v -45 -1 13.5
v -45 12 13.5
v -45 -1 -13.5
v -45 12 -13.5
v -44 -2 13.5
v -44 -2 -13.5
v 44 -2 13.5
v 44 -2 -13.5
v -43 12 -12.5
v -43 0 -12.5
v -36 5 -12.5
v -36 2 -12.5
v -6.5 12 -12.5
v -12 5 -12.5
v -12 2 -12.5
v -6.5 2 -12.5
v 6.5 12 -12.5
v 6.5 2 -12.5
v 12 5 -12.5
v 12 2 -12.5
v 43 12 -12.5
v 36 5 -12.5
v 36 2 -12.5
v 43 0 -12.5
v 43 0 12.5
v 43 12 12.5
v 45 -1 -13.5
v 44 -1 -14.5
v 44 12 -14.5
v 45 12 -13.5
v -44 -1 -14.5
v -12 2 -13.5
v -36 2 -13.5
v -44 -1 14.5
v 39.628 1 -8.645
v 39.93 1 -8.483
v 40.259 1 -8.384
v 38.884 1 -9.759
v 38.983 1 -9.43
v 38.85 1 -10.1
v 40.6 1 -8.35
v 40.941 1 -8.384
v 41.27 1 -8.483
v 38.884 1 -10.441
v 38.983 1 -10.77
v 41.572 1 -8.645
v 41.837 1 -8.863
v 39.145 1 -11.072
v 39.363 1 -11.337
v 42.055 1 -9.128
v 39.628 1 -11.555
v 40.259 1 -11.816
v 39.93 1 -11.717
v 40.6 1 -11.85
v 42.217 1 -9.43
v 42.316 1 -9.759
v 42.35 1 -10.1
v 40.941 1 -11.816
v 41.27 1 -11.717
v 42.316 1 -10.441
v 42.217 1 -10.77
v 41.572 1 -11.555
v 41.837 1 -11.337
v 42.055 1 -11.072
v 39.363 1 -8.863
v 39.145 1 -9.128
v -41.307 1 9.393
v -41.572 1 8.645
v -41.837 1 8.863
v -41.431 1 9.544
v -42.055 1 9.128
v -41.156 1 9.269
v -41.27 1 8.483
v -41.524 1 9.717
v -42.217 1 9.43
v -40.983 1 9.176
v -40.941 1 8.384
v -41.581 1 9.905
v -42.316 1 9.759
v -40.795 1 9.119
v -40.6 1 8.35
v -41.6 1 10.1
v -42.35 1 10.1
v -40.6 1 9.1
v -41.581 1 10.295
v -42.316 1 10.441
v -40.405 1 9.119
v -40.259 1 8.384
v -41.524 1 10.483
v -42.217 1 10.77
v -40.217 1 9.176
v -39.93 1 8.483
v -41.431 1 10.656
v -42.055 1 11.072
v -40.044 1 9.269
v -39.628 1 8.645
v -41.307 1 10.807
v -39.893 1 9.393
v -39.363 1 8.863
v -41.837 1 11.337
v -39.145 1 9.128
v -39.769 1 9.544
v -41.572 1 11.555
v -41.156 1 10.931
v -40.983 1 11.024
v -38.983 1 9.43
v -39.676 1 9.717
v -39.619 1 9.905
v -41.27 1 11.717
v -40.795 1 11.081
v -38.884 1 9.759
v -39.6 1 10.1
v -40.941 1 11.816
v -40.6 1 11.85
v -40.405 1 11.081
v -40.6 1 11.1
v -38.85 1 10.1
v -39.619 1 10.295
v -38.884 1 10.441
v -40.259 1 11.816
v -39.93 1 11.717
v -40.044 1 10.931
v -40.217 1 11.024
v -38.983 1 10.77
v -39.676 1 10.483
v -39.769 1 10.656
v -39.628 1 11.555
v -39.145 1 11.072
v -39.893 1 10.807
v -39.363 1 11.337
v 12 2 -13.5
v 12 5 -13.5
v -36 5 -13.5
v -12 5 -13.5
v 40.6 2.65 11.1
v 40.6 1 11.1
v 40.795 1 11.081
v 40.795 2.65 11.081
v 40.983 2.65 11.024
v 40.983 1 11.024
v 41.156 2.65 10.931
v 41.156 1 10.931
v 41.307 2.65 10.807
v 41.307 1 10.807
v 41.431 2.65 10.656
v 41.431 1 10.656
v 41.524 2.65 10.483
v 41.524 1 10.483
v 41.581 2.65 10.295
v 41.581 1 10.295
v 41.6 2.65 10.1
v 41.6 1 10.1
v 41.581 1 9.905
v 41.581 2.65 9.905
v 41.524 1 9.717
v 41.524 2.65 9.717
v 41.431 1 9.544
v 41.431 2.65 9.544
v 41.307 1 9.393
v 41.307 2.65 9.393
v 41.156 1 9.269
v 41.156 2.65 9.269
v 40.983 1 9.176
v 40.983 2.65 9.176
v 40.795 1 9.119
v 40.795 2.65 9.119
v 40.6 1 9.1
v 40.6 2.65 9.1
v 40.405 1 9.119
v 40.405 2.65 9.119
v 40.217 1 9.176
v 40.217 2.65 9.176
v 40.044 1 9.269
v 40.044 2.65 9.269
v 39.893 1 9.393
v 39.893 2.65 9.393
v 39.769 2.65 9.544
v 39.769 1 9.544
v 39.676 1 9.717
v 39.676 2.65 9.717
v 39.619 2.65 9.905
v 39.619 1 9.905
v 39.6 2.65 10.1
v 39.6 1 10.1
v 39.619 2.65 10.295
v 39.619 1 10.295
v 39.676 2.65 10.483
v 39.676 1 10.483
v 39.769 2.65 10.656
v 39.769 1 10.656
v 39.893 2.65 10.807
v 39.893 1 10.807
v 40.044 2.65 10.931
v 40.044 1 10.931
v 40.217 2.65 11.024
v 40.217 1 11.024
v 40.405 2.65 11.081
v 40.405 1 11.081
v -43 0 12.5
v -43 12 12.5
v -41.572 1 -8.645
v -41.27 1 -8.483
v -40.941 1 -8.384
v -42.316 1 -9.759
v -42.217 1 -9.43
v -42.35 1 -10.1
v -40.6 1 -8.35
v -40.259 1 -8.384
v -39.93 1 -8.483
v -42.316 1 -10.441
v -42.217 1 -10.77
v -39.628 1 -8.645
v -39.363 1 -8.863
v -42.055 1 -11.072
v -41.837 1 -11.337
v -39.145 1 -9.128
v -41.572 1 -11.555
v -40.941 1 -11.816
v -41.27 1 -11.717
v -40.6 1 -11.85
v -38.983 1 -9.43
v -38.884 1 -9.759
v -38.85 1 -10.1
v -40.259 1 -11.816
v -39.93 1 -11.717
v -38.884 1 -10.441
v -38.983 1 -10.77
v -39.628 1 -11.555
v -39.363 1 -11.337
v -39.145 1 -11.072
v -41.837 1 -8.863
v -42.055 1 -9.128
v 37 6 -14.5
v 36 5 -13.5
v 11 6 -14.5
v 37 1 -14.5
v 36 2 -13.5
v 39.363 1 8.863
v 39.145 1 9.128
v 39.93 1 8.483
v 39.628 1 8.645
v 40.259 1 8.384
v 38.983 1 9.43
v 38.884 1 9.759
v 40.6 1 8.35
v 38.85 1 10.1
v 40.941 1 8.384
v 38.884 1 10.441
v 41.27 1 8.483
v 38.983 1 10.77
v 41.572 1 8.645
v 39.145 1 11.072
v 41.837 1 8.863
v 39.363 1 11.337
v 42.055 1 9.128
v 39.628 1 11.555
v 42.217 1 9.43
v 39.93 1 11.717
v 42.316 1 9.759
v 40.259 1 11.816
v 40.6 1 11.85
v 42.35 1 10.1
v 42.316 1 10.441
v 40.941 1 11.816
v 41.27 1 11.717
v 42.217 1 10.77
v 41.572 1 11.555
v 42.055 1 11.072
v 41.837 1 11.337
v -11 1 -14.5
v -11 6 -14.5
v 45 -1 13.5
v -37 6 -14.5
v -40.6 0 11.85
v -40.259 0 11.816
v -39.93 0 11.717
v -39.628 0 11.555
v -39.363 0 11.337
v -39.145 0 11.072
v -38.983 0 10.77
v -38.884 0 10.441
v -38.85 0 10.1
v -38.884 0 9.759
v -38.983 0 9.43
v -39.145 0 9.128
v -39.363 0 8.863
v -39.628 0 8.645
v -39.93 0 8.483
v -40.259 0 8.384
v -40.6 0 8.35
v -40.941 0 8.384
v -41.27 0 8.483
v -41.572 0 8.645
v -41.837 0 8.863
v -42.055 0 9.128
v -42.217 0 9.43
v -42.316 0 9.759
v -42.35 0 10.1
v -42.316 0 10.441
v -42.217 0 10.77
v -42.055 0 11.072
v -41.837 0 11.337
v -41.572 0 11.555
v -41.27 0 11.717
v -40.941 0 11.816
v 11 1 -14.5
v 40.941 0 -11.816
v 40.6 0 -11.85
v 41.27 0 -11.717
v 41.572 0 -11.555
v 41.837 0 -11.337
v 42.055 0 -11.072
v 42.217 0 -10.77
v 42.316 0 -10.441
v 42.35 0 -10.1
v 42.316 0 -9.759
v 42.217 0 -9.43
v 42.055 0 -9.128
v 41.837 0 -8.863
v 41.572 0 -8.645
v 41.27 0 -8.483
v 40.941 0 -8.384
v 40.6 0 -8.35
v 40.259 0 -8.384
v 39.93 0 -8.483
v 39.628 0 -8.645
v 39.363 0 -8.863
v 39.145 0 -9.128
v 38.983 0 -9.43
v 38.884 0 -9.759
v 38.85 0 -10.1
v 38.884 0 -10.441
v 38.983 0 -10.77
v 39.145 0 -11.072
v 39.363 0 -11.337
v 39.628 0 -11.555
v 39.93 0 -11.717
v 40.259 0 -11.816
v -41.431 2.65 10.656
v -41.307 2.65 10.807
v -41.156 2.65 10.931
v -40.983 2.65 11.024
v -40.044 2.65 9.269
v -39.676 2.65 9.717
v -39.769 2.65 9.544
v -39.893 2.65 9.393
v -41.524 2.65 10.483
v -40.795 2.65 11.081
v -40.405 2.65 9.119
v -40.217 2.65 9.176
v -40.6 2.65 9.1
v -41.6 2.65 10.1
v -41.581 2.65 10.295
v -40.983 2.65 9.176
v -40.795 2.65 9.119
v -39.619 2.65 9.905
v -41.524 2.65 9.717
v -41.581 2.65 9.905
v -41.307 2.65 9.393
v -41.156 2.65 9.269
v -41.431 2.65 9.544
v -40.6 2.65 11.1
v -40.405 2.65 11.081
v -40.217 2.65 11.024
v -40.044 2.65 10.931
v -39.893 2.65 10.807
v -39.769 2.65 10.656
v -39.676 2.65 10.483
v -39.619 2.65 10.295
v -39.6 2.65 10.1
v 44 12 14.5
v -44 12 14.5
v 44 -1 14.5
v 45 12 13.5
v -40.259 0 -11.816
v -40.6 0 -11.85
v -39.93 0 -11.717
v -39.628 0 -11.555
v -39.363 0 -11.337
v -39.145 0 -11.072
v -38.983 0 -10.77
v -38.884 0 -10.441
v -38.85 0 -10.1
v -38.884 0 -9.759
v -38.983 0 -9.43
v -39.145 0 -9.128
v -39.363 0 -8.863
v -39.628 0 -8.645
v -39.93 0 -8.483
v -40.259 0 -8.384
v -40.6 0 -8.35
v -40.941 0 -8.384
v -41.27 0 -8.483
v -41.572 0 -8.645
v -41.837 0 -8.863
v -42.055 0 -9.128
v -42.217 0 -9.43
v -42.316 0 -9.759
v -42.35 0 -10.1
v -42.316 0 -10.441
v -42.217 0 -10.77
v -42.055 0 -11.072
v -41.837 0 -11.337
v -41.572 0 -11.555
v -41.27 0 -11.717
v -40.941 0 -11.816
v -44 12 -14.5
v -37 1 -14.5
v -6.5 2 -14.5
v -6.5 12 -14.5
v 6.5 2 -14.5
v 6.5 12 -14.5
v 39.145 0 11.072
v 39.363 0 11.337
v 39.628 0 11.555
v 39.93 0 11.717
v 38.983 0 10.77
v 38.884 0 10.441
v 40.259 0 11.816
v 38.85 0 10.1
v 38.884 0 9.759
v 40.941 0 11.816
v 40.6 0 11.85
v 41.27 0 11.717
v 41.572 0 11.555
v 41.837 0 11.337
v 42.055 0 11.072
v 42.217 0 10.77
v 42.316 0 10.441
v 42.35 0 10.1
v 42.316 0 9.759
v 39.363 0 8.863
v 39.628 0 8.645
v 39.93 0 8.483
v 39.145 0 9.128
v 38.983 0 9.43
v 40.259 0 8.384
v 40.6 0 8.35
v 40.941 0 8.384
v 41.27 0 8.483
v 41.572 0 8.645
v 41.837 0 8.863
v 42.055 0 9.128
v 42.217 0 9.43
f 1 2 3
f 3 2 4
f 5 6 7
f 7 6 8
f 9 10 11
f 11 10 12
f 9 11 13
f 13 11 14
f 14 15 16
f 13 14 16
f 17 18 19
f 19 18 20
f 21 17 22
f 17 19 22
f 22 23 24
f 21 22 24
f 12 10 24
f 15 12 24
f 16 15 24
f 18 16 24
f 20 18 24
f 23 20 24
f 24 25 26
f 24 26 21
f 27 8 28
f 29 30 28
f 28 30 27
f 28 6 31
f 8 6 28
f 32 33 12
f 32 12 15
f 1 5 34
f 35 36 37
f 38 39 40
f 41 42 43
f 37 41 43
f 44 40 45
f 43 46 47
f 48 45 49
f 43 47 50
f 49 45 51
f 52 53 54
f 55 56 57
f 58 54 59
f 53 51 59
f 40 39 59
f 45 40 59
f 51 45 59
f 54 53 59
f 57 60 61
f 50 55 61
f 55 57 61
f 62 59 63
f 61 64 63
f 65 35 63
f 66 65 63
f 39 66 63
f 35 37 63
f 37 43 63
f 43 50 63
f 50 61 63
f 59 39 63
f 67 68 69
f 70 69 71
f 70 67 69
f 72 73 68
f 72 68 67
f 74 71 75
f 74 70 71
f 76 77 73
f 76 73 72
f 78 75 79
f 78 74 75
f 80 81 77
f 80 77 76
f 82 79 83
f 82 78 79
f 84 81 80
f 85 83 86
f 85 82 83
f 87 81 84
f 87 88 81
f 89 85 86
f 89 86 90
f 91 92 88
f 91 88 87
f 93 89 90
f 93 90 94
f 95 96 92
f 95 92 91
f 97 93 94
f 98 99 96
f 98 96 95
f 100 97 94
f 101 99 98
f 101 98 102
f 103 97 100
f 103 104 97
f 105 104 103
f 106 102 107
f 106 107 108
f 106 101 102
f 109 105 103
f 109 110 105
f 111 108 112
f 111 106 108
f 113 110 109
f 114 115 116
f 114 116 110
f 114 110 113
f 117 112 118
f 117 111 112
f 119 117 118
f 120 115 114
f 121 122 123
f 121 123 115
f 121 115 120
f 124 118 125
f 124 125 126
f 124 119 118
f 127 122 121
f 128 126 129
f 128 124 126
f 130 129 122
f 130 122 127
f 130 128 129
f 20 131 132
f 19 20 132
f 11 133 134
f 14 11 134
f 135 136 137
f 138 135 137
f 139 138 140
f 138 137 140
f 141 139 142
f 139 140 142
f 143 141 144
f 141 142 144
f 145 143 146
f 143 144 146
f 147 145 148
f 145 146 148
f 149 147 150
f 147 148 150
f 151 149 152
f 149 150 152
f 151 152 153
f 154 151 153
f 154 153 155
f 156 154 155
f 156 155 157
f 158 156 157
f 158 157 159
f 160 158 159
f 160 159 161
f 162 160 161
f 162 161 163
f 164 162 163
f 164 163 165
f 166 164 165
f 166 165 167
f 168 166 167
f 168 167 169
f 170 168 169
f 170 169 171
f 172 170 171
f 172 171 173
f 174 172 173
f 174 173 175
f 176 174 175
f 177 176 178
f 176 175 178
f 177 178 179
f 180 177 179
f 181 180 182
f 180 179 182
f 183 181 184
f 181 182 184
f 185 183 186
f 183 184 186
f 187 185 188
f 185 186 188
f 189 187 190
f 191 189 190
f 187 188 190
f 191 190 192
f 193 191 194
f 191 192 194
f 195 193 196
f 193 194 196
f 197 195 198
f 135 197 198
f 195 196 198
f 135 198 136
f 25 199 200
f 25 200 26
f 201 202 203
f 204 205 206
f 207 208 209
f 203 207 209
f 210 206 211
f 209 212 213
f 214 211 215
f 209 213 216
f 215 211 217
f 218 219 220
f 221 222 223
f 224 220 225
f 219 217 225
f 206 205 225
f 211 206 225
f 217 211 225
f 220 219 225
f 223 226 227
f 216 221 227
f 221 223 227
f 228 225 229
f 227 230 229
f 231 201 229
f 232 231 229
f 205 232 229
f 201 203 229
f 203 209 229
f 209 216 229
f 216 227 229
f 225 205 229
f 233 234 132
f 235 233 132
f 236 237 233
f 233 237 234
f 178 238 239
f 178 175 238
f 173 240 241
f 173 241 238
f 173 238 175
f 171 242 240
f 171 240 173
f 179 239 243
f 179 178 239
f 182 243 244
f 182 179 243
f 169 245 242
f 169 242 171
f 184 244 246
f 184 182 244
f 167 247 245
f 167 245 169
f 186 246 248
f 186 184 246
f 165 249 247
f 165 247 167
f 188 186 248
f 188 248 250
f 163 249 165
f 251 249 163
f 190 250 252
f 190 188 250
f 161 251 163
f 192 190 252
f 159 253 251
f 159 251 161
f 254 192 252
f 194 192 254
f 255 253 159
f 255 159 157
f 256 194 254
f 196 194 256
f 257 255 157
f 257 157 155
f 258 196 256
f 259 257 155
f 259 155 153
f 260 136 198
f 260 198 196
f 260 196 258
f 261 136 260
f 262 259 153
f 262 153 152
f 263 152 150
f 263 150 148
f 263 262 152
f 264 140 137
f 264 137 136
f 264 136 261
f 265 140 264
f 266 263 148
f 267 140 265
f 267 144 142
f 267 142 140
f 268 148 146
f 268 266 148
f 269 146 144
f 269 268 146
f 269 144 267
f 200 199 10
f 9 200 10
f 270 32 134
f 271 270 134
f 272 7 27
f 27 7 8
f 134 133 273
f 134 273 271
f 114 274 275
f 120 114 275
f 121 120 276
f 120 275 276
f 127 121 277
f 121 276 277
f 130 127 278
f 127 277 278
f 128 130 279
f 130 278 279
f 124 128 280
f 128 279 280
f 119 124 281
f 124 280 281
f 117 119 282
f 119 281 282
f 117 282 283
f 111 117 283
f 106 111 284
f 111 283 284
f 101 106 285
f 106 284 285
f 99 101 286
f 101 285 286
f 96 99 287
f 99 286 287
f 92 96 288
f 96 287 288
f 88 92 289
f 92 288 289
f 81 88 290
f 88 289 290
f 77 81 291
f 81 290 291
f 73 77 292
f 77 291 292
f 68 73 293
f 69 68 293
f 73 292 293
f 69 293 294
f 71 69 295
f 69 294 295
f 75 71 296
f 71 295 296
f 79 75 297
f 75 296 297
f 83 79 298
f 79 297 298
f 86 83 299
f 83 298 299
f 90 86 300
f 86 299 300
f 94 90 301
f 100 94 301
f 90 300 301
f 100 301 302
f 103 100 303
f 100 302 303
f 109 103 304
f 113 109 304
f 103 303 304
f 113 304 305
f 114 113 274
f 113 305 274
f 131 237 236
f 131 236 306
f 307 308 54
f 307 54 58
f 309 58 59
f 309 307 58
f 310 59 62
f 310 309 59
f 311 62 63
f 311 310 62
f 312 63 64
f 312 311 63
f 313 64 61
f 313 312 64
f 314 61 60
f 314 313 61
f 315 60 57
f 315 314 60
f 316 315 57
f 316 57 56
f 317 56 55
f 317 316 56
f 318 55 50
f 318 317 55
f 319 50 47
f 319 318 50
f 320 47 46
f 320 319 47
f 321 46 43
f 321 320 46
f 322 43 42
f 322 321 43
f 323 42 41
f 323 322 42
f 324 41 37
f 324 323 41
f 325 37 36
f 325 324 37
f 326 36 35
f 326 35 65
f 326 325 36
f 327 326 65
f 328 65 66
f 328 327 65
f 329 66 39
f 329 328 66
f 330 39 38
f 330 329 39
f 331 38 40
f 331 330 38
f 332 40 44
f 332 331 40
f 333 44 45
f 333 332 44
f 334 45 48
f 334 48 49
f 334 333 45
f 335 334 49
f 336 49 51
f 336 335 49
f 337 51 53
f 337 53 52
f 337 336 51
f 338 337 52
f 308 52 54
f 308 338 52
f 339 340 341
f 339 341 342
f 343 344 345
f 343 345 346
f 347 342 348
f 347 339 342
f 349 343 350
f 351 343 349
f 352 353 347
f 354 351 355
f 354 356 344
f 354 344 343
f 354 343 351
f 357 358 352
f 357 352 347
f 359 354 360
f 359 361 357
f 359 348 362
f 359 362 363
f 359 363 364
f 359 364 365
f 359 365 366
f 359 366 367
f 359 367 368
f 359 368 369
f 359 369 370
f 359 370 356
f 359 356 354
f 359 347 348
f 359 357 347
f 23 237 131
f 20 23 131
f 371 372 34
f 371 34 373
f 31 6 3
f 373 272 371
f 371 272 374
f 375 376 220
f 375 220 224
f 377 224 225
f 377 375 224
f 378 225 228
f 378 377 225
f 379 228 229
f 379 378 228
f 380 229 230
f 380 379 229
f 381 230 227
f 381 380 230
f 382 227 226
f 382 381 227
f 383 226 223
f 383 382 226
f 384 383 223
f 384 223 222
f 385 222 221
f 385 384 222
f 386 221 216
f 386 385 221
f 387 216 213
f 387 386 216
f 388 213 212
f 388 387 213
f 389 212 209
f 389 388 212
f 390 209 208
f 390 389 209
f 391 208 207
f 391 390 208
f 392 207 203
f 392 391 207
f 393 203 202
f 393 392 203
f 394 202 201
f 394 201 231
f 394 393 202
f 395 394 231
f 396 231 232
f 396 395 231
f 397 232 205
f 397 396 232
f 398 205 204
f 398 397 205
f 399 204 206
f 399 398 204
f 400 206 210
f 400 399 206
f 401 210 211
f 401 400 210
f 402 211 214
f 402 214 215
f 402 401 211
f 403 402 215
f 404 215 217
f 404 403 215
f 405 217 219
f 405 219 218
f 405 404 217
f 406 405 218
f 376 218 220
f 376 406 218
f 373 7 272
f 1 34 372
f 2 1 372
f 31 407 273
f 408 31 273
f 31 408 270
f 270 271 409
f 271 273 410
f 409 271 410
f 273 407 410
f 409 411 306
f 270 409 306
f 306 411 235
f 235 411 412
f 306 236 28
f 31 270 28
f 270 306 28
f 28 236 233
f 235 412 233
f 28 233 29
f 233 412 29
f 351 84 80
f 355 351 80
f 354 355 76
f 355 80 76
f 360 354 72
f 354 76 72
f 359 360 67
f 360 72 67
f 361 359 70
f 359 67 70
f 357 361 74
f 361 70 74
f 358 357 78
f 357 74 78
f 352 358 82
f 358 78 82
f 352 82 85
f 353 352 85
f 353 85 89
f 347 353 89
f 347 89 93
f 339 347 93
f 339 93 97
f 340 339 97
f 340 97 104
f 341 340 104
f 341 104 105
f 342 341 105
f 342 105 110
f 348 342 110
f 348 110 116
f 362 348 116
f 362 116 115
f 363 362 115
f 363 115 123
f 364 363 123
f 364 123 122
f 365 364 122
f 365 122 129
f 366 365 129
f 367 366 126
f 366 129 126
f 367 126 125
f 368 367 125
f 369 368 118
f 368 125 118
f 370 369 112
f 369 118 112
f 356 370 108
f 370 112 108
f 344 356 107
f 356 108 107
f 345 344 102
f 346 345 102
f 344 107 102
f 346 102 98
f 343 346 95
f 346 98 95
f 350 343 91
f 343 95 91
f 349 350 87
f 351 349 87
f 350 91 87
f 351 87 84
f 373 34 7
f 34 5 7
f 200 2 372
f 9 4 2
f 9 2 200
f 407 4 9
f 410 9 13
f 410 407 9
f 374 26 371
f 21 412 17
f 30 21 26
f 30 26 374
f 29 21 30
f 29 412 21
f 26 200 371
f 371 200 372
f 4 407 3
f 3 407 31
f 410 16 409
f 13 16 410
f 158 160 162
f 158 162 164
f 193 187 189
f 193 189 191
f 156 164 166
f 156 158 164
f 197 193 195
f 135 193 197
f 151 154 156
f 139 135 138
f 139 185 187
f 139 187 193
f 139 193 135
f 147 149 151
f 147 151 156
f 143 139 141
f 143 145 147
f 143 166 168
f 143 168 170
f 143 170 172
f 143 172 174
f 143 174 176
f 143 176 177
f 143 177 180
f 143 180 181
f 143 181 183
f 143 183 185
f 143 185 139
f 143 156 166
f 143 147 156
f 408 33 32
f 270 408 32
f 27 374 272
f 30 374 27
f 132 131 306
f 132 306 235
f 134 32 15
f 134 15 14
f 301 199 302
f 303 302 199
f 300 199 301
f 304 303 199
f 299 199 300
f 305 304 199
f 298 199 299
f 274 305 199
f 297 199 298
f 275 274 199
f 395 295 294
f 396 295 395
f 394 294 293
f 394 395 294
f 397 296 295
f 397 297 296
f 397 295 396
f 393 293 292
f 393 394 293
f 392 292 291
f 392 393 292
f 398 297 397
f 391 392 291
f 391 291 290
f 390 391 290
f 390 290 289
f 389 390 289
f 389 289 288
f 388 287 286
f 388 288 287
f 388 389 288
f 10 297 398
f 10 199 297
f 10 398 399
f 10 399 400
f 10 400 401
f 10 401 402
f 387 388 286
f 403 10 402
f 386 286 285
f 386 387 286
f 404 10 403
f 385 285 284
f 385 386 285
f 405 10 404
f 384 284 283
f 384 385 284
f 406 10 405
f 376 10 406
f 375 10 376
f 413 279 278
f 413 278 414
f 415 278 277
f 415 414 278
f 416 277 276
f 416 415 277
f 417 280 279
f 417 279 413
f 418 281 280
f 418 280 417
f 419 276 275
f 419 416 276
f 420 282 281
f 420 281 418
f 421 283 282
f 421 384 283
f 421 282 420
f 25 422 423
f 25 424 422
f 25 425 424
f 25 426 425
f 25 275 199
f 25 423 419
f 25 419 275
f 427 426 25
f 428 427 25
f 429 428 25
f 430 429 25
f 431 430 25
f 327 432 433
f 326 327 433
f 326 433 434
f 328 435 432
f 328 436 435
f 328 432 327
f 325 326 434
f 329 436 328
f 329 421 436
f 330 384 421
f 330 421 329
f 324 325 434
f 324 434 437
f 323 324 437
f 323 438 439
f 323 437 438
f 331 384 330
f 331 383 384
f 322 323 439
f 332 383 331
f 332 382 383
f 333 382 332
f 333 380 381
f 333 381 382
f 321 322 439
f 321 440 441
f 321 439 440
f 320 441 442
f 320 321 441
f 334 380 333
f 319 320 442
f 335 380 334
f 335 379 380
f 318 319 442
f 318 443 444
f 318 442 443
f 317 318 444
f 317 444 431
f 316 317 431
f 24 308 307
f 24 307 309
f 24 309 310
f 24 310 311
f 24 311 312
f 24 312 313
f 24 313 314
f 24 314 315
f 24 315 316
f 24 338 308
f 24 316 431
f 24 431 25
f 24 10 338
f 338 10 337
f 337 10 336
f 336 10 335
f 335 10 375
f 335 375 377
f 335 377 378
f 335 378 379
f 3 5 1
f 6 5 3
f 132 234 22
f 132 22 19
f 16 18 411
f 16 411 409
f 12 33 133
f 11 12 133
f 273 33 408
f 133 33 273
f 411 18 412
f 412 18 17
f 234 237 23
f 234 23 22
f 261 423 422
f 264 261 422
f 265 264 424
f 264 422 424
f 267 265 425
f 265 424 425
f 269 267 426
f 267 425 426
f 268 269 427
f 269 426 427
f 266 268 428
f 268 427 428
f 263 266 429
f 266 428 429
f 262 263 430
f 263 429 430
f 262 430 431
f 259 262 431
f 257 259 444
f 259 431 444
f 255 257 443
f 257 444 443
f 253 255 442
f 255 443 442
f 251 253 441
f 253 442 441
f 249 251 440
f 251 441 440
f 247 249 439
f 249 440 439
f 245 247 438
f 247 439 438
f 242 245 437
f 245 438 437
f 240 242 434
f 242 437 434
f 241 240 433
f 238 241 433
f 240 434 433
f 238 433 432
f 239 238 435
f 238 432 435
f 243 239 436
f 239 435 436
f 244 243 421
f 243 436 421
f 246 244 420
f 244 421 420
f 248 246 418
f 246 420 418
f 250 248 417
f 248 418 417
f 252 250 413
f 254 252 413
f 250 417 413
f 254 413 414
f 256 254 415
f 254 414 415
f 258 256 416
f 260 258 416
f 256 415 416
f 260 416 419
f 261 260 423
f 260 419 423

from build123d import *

# Parameters (mm, degrees)
SKETCH1_W                = 90
SKETCH1_H                = 29
SKETCH1_W_2              = 86
SKETCH1_H_2              = 25
BOSS_EXTRUDE1_DEPTH      = 12
SKETCH1_2_W              = 90
SKETCH1_2_H              = 29
BOSS_EXTRUDE2_DEPTH      = 2
SKETCH2_R                = 1
BOSS_EXTRUDE3_DEPTH      = 2.65
SKETCH3_R                = 1.75
BOSS_EXTRUDE4_DEPTH      = 1
CHAMFER1_SIZE            = 1
CUT_EXTRUDE1_REACH       = 55.833
SKETCH4_W                = 13
SKETCH4_H                = 10
CUT_EXTRUDE2_REACH       = 56.863
SKETCH5_W                = 24
SKETCH5_H                = 3
CHAMFER2_SIZE            = 1
CHAMFER2_OF_MIRROR2_SIZE = 1


with BuildPart() as part:
    # Sketch1 → Boss-Extrude1 (new body)
    with BuildSketch(Plane(origin=(0, 0, 0), x_dir=(1, 0, 0), z_dir=(0, 1, 0))):
        Rectangle(SKETCH1_W, SKETCH1_H)
        Rectangle(SKETCH1_W_2, SKETCH1_H_2, mode=Mode.SUBTRACT)
    extrude(amount=BOSS_EXTRUDE1_DEPTH)

    # Sketch1<2> → Boss-Extrude2 (add)
    with BuildSketch(Plane(origin=(0, 0, 0), x_dir=(1, 0, 0), z_dir=(0, 1, 0))):
        Rectangle(SKETCH1_2_W, SKETCH1_2_H)
    extrude(amount=-BOSS_EXTRUDE2_DEPTH)

    # Sketch2 → Boss-Extrude3 (add)
    with BuildSketch(Plane(origin=(0, 0, 0), x_dir=(1, 0, 0), z_dir=(0, 1, 0))):
        with Locations((40.6, -10.1)):
            Circle(SKETCH2_R)
        with Locations((-40.6, -10.1)):
            Circle(SKETCH2_R)
    extrude(amount=BOSS_EXTRUDE3_DEPTH)

    # Sketch3 → Boss-Extrude4 (add)
    with BuildSketch(Plane(origin=(0, 0, 0), x_dir=(1, 0, 0), z_dir=(0, 1, 0))):
        with Locations((40.6, -10.1)):
            Circle(SKETCH3_R)
        with Locations((-40.6, -10.1)):
            Circle(SKETCH3_R)
    boss_extrude4 = extrude(amount=BOSS_EXTRUDE4_DEPTH)

    # Mirror1: Boss-Extrude4 across plane
    add(boss_extrude4.mirror(Plane.XY))

    # Chamfer1
    chamfer1_edges = [part.edges().sort_by_distance(p)[0] for p in [
        (45, 5, -14.5),
        (45, 5, 14.5),
        (45, -2, 0),
        (0, -2, 14.5),
        (-45, 5, 14.5),
        (-45, -2, 0),
        (0, -2, -14.5),
        (-45, 5, -14.5),
    ]]
    chamfer(chamfer1_edges, length=CHAMFER1_SIZE)

    # Sketch4 → Cut-Extrude1 (cut, up to next)
    with BuildSketch(Plane(origin=(0, 0, -12.5), x_dir=(-1, 0, 0), z_dir=(0, 0, -1)), mode=Mode.PRIVATE) as cut_extrude1_sk1:
        with Locations((0, 7)):
            Rectangle(SKETCH4_W, SKETCH4_H)
    cut_extrude1_tool1 = extrude(cut_extrude1_sk1.sketch, amount=CUT_EXTRUDE1_REACH, mode=Mode.PRIVATE) & part.part
    add(cut_extrude1_tool1.solids().sort_by_distance((0, 7, -12.5))[0], mode=Mode.SUBTRACT)

    # Sketch5 → Cut-Extrude2 (cut, up to next)
    with BuildSketch(Plane(origin=(0, 0, -14.5), x_dir=(-1, 0, 0), z_dir=(0, 0, -1)), mode=Mode.PRIVATE) as cut_extrude2_sk1:
        with Locations((-24, 3.5)):
            Rectangle(SKETCH5_W, SKETCH5_H)
    cut_extrude2_tool1 = extrude(cut_extrude2_sk1.sketch, amount=-CUT_EXTRUDE2_REACH, mode=Mode.PRIVATE) & part.part
    cut_extrude2 = cut_extrude2_tool1.solids().sort_by_distance((24, 3.5, -14.5))[0]
    add(cut_extrude2, mode=Mode.SUBTRACT)

    # Chamfer2
    chamfer2_edges = [part.edges().sort_by_distance(p)[0] for p in [
        (36, 3.5, -14.5),
        (24, 2, -14.5),
        (12, 3.5, -14.5),
        (24, 5, -14.5),
    ]]
    chamfer(chamfer2_edges, length=CHAMFER2_SIZE)

    # Mirror2: Cut-Extrude2 across plane
    add(cut_extrude2.mirror(Plane(origin=(0, 0, 0), x_dir=(0, 0, 1), z_dir=(1, 0, 0))), mode=Mode.SUBTRACT)

    # Chamfer2 of Mirror2
    chamfer2_of_mirror2_edges = [part.edges().sort_by_distance(p)[0] for p in [
        (-36, 3.5, -14.5),
        (-24, 2, -14.5),
        (-12, 3.5, -14.5),
        (-24, 5, -14.5),
    ]]
    chamfer(chamfer2_of_mirror2_edges, length=CHAMFER2_OF_MIRROR2_SIZE)


solid = part.part
